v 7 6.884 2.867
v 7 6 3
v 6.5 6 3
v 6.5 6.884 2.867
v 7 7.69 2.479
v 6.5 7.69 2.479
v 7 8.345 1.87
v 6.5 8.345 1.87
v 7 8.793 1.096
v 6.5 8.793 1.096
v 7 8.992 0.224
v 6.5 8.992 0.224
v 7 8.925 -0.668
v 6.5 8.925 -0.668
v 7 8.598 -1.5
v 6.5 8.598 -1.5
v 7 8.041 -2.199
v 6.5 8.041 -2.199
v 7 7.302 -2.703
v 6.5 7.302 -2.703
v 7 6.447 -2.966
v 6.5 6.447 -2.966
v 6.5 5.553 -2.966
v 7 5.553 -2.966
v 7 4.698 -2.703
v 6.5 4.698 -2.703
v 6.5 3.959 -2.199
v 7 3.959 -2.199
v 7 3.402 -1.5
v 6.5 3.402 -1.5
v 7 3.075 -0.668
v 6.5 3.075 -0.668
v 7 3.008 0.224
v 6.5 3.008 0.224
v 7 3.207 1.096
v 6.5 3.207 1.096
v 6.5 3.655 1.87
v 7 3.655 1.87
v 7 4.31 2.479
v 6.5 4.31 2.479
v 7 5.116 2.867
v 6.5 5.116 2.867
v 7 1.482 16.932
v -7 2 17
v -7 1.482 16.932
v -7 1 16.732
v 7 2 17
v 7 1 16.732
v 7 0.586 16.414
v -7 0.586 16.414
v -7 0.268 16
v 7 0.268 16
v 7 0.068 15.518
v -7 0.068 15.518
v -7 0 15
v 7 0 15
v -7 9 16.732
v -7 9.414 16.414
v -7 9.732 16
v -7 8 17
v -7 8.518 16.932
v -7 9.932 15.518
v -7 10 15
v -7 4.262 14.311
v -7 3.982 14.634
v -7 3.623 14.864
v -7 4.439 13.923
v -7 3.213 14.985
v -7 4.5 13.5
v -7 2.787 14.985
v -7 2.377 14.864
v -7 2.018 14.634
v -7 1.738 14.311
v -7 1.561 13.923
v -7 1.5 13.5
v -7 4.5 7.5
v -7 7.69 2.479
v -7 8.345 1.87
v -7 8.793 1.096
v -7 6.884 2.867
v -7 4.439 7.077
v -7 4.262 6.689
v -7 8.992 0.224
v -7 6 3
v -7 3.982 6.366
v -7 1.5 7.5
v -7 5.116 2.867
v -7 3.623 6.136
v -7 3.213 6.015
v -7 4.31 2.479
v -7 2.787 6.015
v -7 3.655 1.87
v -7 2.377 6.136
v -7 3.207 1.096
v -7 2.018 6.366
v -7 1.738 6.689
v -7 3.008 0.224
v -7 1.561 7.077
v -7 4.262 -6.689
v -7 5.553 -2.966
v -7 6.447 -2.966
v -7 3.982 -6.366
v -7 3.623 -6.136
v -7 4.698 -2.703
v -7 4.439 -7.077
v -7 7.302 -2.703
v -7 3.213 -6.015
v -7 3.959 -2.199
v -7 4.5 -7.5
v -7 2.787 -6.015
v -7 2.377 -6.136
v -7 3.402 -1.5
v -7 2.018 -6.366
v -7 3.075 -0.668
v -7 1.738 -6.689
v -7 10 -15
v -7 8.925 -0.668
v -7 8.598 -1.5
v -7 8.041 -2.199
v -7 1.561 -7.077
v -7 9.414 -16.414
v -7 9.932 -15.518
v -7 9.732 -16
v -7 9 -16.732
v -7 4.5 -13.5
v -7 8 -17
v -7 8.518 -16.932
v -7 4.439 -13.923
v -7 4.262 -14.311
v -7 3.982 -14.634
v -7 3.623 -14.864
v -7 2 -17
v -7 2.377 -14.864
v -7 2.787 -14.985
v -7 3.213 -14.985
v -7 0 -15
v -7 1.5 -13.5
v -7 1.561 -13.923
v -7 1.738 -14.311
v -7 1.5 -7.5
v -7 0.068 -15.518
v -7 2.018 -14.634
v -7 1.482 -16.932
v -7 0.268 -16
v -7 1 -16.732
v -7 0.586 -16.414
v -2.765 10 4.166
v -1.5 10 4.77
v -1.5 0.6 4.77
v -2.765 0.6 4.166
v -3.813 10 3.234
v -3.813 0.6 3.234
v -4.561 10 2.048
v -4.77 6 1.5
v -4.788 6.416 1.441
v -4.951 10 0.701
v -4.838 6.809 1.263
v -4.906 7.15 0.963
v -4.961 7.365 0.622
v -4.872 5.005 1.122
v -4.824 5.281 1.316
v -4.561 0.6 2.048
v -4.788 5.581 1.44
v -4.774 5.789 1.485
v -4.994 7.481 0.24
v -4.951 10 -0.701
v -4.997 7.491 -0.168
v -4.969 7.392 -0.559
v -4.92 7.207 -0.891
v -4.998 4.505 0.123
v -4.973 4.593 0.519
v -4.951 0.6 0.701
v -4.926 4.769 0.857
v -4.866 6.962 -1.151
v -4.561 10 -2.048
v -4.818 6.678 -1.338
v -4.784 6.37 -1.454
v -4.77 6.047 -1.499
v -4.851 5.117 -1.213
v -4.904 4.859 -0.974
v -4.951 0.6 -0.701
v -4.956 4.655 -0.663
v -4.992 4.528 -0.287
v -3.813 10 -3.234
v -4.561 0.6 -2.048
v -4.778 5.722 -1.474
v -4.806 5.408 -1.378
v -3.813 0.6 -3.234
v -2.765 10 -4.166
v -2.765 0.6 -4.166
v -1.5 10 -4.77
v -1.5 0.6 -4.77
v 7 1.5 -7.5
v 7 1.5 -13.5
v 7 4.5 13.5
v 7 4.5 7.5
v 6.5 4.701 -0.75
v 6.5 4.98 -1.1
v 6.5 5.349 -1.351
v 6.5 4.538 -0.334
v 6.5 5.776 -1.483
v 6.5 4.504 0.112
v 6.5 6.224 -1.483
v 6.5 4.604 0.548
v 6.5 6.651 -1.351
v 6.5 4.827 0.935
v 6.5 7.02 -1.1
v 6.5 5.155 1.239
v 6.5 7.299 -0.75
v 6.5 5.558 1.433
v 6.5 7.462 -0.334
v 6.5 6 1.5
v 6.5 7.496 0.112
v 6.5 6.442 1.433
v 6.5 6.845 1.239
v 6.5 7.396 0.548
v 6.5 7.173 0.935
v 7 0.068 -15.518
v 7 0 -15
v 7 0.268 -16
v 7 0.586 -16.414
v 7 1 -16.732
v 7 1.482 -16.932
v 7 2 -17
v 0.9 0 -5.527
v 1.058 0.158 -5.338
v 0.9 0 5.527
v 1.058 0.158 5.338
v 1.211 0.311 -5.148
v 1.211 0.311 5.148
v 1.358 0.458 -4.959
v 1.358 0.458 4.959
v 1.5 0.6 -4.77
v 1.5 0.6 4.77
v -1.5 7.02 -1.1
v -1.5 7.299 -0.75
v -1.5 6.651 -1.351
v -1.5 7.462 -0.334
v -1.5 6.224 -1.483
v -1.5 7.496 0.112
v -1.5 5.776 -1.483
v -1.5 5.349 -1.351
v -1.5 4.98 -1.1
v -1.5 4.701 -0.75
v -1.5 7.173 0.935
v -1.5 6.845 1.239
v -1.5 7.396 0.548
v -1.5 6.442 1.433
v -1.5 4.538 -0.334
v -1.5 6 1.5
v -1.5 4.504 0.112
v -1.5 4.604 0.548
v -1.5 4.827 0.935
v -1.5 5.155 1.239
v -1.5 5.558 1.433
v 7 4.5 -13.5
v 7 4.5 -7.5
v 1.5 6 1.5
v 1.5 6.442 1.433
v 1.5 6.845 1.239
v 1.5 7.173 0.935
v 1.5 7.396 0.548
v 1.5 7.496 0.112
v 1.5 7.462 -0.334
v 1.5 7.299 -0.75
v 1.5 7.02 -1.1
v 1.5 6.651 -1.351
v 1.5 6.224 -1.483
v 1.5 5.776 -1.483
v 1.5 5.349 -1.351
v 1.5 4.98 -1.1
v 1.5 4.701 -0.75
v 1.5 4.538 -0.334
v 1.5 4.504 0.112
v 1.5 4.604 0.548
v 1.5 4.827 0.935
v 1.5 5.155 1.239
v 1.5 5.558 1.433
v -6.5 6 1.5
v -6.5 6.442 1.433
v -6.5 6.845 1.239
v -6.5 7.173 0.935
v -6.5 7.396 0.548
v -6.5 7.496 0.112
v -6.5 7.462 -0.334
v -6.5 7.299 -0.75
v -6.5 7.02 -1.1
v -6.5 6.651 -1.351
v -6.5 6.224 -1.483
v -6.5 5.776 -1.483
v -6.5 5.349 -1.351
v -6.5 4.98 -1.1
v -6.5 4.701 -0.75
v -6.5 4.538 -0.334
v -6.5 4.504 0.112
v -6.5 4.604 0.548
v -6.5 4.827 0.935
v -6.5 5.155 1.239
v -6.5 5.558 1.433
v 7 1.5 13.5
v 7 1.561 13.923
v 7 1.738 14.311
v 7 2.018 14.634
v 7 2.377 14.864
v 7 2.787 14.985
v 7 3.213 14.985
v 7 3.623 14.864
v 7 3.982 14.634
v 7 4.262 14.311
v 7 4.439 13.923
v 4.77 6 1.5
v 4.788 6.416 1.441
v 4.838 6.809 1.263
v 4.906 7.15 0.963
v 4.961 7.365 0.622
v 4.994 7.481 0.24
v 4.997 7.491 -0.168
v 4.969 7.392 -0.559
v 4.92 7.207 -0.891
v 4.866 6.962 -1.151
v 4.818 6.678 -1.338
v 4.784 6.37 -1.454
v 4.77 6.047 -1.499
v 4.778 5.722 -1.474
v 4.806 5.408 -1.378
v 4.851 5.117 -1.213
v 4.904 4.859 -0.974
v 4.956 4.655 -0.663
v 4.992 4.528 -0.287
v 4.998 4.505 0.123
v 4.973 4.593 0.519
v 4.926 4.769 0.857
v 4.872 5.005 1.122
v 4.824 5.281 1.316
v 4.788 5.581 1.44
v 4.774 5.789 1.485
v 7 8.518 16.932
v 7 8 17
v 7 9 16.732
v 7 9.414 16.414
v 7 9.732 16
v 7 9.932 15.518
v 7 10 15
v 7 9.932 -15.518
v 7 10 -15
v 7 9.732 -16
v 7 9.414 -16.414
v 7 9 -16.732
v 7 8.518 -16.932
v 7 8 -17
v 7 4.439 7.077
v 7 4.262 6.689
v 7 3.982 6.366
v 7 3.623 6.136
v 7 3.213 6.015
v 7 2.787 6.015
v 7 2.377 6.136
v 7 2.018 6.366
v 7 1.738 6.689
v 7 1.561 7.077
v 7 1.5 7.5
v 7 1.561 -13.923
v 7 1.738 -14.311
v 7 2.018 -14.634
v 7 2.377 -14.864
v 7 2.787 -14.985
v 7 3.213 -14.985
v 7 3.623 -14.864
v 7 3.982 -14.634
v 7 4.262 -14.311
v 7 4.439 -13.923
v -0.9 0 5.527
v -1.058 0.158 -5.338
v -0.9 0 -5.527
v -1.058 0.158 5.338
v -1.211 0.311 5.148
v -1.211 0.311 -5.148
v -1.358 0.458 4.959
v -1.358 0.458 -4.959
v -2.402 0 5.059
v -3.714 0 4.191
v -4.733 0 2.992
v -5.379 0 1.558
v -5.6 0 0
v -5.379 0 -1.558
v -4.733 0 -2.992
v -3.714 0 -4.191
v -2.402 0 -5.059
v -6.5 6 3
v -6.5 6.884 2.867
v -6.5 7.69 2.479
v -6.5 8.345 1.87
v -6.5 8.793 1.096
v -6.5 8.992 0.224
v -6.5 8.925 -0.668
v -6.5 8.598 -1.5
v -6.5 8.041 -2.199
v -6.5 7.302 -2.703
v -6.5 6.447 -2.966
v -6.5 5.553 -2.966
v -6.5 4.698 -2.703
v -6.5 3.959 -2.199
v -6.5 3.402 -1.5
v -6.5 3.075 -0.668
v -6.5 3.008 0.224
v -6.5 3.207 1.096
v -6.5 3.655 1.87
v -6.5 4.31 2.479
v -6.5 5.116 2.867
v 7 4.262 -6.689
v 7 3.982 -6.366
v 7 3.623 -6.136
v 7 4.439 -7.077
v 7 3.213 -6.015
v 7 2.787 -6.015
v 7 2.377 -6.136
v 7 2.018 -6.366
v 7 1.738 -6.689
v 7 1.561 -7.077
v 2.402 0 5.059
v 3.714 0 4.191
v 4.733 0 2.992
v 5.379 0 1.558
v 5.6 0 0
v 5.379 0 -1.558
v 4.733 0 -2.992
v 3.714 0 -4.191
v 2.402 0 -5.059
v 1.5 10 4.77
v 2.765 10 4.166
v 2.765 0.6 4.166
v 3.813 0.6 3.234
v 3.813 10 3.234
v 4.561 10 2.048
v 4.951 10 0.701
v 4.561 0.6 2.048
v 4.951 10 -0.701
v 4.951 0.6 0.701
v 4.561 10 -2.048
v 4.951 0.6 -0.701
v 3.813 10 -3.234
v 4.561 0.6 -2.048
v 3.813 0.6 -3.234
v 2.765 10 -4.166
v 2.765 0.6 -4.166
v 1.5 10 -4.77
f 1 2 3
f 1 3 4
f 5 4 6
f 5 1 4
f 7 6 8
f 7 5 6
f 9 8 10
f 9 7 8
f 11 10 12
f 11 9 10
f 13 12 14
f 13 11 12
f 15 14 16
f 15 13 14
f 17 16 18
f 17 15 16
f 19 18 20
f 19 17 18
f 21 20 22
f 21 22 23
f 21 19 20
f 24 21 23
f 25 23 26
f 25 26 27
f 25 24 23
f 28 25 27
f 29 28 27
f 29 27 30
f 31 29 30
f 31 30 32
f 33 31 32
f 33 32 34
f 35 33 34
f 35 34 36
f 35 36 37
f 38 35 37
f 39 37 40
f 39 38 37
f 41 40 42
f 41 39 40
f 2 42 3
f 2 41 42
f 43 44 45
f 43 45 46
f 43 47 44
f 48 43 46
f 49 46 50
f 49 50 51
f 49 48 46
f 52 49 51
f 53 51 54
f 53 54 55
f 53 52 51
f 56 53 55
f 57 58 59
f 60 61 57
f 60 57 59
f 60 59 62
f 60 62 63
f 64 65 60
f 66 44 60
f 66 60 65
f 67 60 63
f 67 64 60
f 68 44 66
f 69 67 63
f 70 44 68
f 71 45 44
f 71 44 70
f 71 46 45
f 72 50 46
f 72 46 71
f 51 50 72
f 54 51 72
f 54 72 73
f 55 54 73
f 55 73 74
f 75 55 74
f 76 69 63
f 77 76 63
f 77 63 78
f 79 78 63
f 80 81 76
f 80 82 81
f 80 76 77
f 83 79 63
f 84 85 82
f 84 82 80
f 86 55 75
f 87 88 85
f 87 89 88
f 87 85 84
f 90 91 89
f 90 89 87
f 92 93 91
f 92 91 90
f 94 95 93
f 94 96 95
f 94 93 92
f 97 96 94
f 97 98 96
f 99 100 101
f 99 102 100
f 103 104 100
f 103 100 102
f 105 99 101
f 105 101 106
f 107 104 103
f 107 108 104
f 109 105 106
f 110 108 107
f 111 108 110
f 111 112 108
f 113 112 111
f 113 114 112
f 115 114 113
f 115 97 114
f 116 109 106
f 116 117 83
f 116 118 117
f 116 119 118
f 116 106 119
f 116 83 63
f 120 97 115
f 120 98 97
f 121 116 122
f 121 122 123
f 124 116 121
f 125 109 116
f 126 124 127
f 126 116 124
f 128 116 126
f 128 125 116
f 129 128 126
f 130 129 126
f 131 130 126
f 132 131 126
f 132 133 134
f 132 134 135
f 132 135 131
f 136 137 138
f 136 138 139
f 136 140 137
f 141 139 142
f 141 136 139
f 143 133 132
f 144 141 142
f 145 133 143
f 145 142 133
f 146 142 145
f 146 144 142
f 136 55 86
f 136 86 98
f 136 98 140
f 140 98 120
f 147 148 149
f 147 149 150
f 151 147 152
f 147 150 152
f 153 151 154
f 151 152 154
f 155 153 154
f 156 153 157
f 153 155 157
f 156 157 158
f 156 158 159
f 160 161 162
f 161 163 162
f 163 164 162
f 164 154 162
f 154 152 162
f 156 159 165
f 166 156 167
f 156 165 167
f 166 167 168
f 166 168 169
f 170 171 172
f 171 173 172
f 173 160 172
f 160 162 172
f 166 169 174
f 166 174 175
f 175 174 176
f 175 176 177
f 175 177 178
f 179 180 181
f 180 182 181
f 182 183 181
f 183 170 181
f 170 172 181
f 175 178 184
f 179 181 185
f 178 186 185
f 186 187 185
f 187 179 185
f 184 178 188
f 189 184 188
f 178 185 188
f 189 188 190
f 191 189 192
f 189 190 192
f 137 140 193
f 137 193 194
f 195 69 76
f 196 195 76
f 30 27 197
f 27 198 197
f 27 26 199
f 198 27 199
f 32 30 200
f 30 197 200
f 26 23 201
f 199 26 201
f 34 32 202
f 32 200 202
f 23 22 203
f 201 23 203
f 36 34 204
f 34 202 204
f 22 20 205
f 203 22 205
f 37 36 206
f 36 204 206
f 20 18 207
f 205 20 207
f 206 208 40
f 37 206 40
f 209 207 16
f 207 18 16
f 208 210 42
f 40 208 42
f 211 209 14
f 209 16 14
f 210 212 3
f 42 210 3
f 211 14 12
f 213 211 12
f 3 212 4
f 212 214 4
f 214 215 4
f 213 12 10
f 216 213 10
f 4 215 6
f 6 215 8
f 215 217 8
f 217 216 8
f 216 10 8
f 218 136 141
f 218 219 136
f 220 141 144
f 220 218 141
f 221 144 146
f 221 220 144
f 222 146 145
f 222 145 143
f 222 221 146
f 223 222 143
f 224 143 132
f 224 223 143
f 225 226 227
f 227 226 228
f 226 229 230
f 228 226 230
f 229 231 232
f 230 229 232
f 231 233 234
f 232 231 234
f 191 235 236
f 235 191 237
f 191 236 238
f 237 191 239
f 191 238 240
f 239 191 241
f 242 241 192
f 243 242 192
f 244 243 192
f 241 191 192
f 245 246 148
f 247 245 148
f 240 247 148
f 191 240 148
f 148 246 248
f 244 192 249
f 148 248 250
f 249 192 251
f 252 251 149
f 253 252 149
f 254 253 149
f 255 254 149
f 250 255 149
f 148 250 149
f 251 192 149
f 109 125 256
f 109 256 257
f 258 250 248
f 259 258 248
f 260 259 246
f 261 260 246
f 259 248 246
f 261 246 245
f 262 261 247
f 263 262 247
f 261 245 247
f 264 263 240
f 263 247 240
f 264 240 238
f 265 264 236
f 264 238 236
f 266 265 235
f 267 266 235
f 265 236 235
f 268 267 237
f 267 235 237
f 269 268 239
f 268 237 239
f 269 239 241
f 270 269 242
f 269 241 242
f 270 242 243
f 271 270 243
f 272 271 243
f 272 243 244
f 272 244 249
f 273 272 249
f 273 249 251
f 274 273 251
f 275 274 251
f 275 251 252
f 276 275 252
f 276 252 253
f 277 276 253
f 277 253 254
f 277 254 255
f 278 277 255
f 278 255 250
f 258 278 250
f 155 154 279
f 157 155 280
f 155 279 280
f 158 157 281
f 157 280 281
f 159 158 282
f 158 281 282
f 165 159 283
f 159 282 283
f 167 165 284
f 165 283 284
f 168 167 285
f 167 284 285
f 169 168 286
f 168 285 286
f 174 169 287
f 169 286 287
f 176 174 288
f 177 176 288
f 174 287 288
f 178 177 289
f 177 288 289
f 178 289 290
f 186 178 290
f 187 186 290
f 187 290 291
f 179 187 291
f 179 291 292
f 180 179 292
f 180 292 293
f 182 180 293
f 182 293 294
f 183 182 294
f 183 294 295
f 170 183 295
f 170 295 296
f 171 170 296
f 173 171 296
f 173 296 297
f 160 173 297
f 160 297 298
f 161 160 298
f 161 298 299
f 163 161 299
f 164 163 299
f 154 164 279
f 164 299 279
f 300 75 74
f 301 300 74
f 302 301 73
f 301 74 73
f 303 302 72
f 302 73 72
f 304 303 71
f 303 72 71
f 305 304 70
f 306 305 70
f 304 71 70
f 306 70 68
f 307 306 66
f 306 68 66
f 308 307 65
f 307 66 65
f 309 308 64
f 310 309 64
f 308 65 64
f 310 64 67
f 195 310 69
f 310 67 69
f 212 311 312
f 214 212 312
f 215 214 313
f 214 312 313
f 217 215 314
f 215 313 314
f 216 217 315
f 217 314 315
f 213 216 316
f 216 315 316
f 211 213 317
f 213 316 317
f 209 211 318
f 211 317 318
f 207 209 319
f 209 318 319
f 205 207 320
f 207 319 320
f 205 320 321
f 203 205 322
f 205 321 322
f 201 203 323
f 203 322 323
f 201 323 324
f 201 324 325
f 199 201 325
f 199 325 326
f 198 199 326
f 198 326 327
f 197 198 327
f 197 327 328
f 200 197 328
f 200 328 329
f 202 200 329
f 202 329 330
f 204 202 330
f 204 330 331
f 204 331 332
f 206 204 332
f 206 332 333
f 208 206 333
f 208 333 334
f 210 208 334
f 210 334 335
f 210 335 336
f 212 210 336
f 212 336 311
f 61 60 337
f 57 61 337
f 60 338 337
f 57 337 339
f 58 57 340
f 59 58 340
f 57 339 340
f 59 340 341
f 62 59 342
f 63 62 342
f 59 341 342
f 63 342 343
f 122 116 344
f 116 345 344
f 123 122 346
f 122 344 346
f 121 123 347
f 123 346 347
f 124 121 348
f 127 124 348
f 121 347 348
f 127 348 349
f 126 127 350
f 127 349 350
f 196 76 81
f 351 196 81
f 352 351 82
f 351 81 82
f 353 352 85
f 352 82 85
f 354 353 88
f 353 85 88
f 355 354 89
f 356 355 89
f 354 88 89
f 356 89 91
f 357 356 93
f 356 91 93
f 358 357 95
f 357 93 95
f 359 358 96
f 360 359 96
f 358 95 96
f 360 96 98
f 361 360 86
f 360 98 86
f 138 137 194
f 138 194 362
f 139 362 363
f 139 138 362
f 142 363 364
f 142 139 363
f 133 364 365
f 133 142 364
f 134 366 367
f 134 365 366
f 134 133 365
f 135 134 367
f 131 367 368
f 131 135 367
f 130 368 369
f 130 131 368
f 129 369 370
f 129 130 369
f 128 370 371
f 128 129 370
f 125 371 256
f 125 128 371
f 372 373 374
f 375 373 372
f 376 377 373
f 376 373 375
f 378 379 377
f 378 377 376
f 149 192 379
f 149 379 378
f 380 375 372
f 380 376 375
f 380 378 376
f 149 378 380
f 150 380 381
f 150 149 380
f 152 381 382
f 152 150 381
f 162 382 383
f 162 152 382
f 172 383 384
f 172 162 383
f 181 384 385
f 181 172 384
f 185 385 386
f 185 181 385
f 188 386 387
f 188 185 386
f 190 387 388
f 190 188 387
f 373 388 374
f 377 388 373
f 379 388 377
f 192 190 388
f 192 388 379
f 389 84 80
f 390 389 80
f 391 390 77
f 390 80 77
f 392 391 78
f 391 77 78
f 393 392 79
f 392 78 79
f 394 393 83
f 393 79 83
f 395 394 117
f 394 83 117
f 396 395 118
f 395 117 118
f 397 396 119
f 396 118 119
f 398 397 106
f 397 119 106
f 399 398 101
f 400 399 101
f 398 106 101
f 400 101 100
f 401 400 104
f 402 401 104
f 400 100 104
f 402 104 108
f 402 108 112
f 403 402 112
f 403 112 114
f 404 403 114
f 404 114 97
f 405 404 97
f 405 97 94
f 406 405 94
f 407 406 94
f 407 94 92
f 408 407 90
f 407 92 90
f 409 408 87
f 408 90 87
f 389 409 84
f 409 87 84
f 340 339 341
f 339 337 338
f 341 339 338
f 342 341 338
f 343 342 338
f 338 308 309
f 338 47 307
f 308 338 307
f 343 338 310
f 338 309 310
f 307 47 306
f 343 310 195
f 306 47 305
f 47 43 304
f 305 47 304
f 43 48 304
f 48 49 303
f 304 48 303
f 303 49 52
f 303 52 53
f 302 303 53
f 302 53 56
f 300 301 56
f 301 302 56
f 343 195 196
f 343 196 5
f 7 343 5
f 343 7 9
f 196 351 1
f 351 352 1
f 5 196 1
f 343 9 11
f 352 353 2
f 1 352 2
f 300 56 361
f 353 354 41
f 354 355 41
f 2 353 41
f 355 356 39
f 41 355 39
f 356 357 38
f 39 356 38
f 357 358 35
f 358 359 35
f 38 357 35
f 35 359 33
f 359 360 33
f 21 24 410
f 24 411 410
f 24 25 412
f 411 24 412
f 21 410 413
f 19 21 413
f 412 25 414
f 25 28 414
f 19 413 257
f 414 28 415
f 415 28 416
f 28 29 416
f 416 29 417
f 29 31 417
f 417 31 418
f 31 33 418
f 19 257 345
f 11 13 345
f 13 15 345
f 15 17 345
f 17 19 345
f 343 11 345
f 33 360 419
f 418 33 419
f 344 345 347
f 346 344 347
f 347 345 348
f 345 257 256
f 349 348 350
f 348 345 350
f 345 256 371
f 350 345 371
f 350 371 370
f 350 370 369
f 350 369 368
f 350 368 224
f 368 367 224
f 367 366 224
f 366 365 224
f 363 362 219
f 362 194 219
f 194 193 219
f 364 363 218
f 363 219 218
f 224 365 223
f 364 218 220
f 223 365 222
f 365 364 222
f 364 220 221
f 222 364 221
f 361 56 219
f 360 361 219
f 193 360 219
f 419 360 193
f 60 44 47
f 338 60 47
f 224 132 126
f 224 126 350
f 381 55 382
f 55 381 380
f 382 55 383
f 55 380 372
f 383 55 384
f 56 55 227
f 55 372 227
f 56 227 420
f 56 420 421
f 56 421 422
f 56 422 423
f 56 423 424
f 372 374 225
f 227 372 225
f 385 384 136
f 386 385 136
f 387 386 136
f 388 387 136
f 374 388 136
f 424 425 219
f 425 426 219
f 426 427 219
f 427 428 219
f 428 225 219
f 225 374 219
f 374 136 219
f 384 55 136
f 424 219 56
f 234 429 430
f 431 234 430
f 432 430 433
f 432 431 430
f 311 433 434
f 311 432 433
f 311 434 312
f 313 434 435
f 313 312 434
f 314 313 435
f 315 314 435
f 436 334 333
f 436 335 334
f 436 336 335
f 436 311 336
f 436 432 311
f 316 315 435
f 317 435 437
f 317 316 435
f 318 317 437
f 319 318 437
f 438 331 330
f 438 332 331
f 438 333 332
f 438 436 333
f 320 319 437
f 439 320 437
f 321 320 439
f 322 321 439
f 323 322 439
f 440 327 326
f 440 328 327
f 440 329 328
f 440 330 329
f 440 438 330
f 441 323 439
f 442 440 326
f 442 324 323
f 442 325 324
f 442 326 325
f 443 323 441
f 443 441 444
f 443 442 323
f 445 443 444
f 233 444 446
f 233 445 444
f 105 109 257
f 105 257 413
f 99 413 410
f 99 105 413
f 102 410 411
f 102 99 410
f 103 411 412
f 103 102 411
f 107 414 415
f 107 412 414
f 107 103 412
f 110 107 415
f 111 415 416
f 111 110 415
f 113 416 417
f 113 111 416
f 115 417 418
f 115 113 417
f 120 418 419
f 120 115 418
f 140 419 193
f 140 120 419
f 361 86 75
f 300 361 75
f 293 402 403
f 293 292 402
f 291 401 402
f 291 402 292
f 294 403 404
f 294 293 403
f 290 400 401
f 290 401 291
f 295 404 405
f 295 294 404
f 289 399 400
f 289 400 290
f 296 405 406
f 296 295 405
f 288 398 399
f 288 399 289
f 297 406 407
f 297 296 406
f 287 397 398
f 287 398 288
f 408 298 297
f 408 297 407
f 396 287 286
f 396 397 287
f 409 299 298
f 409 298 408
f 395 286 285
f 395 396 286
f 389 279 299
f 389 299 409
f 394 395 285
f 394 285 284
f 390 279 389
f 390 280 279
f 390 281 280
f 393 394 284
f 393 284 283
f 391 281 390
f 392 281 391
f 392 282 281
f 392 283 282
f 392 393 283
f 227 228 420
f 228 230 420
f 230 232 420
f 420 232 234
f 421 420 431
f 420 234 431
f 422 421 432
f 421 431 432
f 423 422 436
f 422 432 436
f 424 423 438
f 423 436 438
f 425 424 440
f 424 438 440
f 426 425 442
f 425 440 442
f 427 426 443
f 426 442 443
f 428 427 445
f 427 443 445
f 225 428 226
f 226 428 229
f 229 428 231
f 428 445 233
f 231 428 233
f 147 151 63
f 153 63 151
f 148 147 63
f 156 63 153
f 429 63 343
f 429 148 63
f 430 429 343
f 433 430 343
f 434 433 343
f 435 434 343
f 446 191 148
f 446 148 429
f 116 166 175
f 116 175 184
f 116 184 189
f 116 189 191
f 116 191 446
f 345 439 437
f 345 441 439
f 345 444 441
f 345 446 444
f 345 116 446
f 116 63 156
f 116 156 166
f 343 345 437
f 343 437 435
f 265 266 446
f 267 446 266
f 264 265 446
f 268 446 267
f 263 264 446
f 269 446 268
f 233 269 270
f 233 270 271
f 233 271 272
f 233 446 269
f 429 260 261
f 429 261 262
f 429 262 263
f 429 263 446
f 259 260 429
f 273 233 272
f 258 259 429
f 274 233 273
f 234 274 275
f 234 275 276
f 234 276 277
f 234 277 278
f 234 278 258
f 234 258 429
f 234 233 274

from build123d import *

# Parameters (mm, degrees)
SKETCH_1_W          = 14
SKETCH_1_H          = 34
EXTRUDE_1_DEPTH     = 10
SKETCH_2_R          = 1.5
CUT_EXTRUDE_1_DEPTH = 25.186773245
SKETCH_3_R          = 3
CUT_EXTRUDE_2_DEPTH = 0.5
CUT_EXTRUDE_3_DEPTH = 25.186773286
FILLET_1_R          = 2
CHAMFER_1_SIZE      = 0.6


with BuildPart() as part:
    # 草图1 → 凸台-拉伸1 (new body)
    with BuildSketch(Plane(origin=(0, 0, 0), x_dir=(1, 0, 0), z_dir=(0, 1, 0))):
        Rectangle(SKETCH_1_W, SKETCH_1_H)
        with BuildLine():
            Line((-1.5, 4.769696007), (-1.5, -4.769696007))
            ThreePointArc((-1.5, -4.769696007), (-5, 0), (-1.5, 4.769696007))
        make_face(mode=Mode.SUBTRACT)
        with BuildLine():
            Line((1.5, 4.769696007), (1.5, -4.769696007))
            ThreePointArc((1.5, -4.769696007), (5, 0), (1.5, 4.769696007))
        make_face(mode=Mode.SUBTRACT)
    extrude(amount=EXTRUDE_1_DEPTH)

    # 草图2 → 切除-拉伸1 (cut, through all)
    with BuildSketch(Plane.ZY.offset(7)):
        with Locations((0, 6)):
            Circle(SKETCH_2_R)
    extrude(amount=-CUT_EXTRUDE_1_DEPTH, mode=Mode.SUBTRACT)

    # 草图3 → 切除-拉伸2 (cut)
    with BuildSketch(Plane.ZY.offset(7)):
        with Locations((0, 6)):
            Circle(SKETCH_3_R)
    cut_extrude_2 = extrude(amount=-CUT_EXTRUDE_2_DEPTH, mode=Mode.SUBTRACT)

    # 镜向1: 切除-拉伸2 across plane
    add(cut_extrude_2.mirror(Plane(origin=(0, 0, 0), x_dir=(0, 0, 1), z_dir=(1, 0, 0))), mode=Mode.SUBTRACT)

    # 草图4 → 切除-拉伸3 (cut, through all)
    with BuildSketch(Plane.ZY.offset(7)):
        with BuildLine():
            Line((-13.5, 4.5), (-7.5, 4.5))
            ThreePointArc((-7.5, 4.5), (-6, 3), (-7.5, 1.5))
            Line((-7.5, 1.5), (-13.5, 1.5))
            ThreePointArc((-13.5, 1.5), (-15, 3), (-13.5, 4.5))
        make_face()
        with BuildLine():
            Line((7.5, 1.5), (13.5, 1.5))
            ThreePointArc((13.5, 1.5), (15, 3), (13.5, 4.5))
            Line((13.5, 4.5), (7.5, 4.5))
            ThreePointArc((7.5, 4.5), (6, 3), (7.5, 1.5))
        make_face()
    extrude(amount=-CUT_EXTRUDE_3_DEPTH, mode=Mode.SUBTRACT)

    # 圆角1
    fillet_1_edges = [part.edges().sort_by_distance(p)[0] for p in [
        (0, 10, 17),
        (0, 0, 17),
        (0, 0, -17),
        (0, 10, -17),
    ]]
    fillet(fillet_1_edges, radius=FILLET_1_R)

    # 倒角1
    chamfer_1_edges = [part.edges().sort_by_distance(p)[0] for p in [
        (5, 0, 0),
        (1.5, 0, 0),
        (-5, 0, 0),
        (-1.5, 0, 0),
    ]]
    chamfer(chamfer_1_edges, length=CHAMFER_1_SIZE)


solid = part.part
